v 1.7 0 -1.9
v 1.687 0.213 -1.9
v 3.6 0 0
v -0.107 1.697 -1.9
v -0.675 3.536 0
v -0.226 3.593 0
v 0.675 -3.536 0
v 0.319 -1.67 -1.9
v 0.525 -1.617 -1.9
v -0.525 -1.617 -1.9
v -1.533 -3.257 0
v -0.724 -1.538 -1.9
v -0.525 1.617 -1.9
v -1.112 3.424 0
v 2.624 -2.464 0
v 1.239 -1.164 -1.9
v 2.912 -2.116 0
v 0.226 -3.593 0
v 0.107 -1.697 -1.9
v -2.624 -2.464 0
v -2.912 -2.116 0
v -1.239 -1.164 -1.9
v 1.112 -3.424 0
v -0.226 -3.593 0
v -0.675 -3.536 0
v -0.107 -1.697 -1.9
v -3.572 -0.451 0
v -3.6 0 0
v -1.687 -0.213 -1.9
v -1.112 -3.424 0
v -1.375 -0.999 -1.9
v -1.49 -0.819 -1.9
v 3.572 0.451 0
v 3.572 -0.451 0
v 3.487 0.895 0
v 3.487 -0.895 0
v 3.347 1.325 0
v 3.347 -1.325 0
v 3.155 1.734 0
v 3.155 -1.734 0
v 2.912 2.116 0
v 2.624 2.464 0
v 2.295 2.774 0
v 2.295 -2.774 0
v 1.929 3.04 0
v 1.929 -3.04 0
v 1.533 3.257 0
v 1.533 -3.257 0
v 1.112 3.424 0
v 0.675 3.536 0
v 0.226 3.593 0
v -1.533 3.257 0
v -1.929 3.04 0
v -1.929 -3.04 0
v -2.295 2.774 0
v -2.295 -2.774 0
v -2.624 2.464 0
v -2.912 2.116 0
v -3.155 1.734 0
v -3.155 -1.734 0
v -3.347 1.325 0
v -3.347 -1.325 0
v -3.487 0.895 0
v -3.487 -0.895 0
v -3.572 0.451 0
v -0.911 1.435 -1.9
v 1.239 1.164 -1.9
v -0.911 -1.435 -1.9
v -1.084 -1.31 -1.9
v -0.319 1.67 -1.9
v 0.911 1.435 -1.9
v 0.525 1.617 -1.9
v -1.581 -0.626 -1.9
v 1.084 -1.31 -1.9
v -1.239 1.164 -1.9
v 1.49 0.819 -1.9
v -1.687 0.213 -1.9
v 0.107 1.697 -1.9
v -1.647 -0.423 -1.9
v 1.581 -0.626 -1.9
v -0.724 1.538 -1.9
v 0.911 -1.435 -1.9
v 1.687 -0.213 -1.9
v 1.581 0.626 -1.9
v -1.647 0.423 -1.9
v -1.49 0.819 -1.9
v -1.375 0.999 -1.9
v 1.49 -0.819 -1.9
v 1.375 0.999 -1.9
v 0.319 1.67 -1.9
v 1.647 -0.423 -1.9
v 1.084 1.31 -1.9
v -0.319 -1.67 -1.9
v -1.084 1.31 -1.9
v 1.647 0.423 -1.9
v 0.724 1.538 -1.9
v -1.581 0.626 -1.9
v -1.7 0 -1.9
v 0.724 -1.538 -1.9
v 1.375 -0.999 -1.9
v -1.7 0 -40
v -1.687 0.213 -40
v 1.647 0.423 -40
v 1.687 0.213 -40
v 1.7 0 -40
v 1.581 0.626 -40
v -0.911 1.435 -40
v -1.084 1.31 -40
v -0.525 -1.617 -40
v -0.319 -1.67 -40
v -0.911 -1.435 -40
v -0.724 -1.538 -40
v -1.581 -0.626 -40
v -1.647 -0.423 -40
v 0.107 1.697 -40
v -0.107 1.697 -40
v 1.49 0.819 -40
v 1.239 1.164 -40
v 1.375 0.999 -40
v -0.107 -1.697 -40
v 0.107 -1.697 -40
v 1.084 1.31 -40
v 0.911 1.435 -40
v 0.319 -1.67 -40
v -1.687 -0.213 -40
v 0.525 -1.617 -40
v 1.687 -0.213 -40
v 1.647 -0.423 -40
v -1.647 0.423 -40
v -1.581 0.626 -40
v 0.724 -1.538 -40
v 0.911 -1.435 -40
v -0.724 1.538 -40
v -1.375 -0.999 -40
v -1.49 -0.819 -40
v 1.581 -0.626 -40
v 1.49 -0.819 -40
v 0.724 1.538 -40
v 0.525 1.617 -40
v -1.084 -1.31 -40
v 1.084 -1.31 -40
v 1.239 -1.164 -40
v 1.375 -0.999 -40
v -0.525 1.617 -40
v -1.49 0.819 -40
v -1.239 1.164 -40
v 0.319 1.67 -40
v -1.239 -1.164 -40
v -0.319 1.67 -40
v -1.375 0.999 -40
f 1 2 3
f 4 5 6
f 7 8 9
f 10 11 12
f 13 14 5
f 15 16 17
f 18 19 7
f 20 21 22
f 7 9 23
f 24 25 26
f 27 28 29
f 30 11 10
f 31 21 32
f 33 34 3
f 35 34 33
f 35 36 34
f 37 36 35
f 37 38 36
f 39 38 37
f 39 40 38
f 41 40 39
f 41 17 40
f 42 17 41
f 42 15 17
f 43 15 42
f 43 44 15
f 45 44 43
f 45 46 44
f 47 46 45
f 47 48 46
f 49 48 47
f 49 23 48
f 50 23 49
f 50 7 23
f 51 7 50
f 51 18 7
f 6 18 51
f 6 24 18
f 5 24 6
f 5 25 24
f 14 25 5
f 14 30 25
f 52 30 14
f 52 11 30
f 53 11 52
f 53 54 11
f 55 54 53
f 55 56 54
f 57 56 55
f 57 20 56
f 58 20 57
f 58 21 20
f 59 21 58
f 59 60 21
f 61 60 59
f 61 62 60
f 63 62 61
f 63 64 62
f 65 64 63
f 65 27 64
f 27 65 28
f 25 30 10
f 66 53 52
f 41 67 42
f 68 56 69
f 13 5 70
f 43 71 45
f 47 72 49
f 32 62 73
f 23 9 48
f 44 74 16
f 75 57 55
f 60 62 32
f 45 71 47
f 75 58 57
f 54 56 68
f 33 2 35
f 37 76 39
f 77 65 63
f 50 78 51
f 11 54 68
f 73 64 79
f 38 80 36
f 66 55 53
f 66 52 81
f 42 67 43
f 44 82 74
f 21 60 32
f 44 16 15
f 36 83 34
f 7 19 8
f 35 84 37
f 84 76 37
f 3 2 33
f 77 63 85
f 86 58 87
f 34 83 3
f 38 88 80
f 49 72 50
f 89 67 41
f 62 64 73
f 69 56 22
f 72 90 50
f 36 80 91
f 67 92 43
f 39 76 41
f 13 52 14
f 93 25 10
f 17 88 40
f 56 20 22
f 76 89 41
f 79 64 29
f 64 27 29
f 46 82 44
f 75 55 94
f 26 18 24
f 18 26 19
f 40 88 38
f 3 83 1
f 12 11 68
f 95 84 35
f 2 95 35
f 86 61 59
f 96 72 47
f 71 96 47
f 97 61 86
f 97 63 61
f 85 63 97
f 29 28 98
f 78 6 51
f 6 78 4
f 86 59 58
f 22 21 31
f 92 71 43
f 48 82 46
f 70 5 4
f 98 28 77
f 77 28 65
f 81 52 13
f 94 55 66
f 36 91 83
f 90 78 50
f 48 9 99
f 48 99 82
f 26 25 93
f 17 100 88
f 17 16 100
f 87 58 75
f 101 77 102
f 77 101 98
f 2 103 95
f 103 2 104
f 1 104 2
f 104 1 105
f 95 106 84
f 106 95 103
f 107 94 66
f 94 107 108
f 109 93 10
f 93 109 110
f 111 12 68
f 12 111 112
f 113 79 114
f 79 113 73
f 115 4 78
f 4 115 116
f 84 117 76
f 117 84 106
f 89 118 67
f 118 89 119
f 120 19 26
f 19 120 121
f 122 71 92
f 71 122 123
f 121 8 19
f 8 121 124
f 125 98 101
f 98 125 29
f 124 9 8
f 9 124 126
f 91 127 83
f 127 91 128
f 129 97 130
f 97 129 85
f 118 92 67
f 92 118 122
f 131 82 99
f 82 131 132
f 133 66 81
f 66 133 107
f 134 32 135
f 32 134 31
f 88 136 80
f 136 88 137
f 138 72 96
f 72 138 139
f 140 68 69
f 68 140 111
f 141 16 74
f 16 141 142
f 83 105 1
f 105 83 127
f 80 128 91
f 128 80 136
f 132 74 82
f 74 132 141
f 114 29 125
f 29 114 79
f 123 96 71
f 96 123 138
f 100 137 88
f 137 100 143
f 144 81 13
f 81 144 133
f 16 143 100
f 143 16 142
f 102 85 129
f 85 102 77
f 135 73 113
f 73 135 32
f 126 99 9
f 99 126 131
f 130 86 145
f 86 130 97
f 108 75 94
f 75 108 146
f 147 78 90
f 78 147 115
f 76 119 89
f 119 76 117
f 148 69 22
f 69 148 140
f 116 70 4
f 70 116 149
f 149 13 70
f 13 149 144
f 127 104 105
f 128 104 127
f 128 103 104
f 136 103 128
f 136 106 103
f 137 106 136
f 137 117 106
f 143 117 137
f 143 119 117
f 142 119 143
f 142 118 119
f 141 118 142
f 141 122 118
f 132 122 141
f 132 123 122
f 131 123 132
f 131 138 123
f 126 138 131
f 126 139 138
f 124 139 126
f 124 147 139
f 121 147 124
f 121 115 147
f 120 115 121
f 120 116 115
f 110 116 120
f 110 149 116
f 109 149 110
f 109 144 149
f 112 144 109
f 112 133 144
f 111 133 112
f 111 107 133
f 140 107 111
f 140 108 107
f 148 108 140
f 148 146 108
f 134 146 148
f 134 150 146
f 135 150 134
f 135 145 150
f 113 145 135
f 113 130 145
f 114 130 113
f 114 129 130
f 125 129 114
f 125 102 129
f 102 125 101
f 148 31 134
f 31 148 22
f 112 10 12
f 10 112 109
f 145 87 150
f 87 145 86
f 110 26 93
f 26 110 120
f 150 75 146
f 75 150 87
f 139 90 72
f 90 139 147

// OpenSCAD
// Generated by SolidPython 1.1.3 on 2023-03-13 21:43:03
$fn = 50;


difference() {
	union() {
		translate(v = [0, 0, -1.9000000000]) {
			rotate(a = [0, 0, 0]) {
				cylinder(h = 1.9000000000, r1 = 1.7000000000, r2 = 3.6000000000);
			}
		}
		translate(v = [0, 0, -40]) {
			rotate(a = [0, 0, 0]) {
				cylinder(h = 40, r = 1.7000000000);
			}
		}
	}
	union();
}
/***********************************************
*********      SolidPython code:      **********
************************************************
 
from solid import *
import os
import subprocess

import oomB

import opsc_library_gen

mode = "laser"
#mode = "3d_print"

defined_objects = {}

radius_dict = {}
countersunk_dict = {}


def set_mode(m):
    global mode
    mode = m
    radius_dict['M6'] = 6.5/2
    radius_dict['M3'] = 3.3/2
    if mode == "laser":
        radius_dict['M6'] = 6/2
        radius_dict['M3'] = 3/2

    countersunk_dict['M3'] = {}
    countersunk_dict['M3']['little_rad'] = radius_dict['M3']
    countersunk_dict['M3']['big_rad'] = (5.5+0.6)/2
    if mode == "laser":
        countersunk_dict['M3']['big_rad'] = (4.75+0.6)/2
        countersunk_dict['M3']['little_rad'] = (4.75+0.6)/2

    countersunk_dict['M3']['height'] = 1.7


def opsc_make_object(filename, objects, save_type="none",resolution=50, layers = 1, tilediff = 200, mode="laser", overwrite=True):
    if overwrite or not os.path.exists(filename):
        set_mode(mode)
        save_type = save_type.lower()
        os.makedirs(os.path.dirname(filename), exist_ok=True)
        final_object = opsc_get_object(objects, mode = mode)
        # Save the final object to the specified filename    
        scad_render_to_file(final_object, filename, file_header='$fn = %s;' % resolution, include_orig_code=True)
        if save_type == "all":
            saveToAll(filename)
        elif save_type == "dxf":
            saveToDxf(filename)
        if mode == "laser":
            filename_laser = filename.replace(".scad","-flat.scad")
            scad_render_to_file(getLaser(final_object, layers=layers, tilediff=tilediff), filename_laser, file_header='$fn = %s;' % resolution, include_orig_code=True)
            if save_type == "all":
                saveToAll(filename_laser)
            elif save_type == "dxf":
                saveToDxf(filename_laser)


def opsc_get_object(objects, mode = "laser"):
    # Create the solidpython objects only include the positive objects and if they don't have inclusion or their inclusion is either all or mode
    # Initialize an empty list to store the results
    positive_objects = []

    # Iterate over the "objects" list
    for obj in objects:
        # Check if the current object has a "type" key with a value of "positive"
        if obj['type'] == 'positive':
            # Check if the current object has an "inclusion" key and its value matches "mode",
            # or if the current object does not have an "inclusion" key at all
            if not 'inclusion' in obj or obj['inclusion'] == "all" or obj['inclusion'] == mode:
                # Call the "get_opsc_item" function with the current object as an argument
                opsc_item = get_opsc_item(obj)
                # Add the result to the "positive_objects" list
                positive_objects.append(opsc_item)
# Initialize an empty list to store the results
    negative_objects = []

    # Iterate over the "objects" list
    for obj in objects:
        # Check if the current object has a "type" key with a value of "negative"
        if obj['type'] == 'negative':
            # Check if the current object has an "inclusion" key and its value matches "mode",
            # or if the current object does not have an "inclusion" key at all
            if not 'inclusion' in obj or obj['inclusion'] == "all" or obj['inclusion'] == mode:
                # Call the "get_opsc_item" function with the current object as an argument
                opsc_item = get_opsc_item(obj)
                # Add the result to the "negative_objects" list
                negative_objects.append(opsc_item)
    
    #positive_objects = [get_opsc_item(obj) for obj in objects if obj['type'] == 'positive']
    #negative_objects = [get_opsc_item(obj) for obj in objects if obj['type'] == 'negative']
    # Union the positive objects
    positive_object = union()(*positive_objects)
    # Union the negative objects
    negative_object = union()(*negative_objects)
    # Create the final object by subtracting the negative objects from the positive objects
    return difference()(positive_object, negative_object)

def get_opsc_item(params):
    # A dictionary to map radius string values to numerical values
    #radius_dict = {'small': 5, 'medium': 10, 'large': 15}
    # An array of function names for basic shapes
    basic_shapes = ['cube', 'sphere', 'cylinder']
    
    # An array of function names for other shapes
    other_shapes = ['hole', 'slot', 'rounded_rectangle', 'countersunk', 'polyg']
    


    # Convert radius to r if present, and remove radius from the params dictionary
    if 'radius' in params:
        if isinstance(params['radius'], str):
            # Use the radius_dict to map the radius string value to a numerical value
            params['r'] = radius_dict[params['radius']]
        else:
            params['r'] = params['radius']
        del params['radius']
    

    # Check if the object type is a basic shape
    if params['shape'] in basic_shapes:
        # Remove shape and unexpected dictionary values
        allowed_keys = {'size', 'r', 'r1', 'r2', 'd', 'h', 'rw', 'rh', 'dw', 'dh'}
        shape_params = {k: v for k, v in params.items() if k in allowed_keys}

        #params['m'] = "#"
        ###split for adding modifier
        try:
            m = params['m']
            func = globals()[params['shape']]
            return_value = get_opsc_transform(params,func(**shape_params))
            return_value = (return_value).set_modifier(m)
            return return_value
        except KeyError as e:
            return get_opsc_transform(params,globals()[params['shape']](**shape_params))
        
    elif params['shape'] == 'polygon':
        # Remove shape and unexpected dictionary values
        h  = params['height']
        allowed_keys = {'points'}
        shape_params = {k: v for k, v in params.items() if k in allowed_keys}

        # Call the corresponding function for the shape parameter, using ** notation to pass the shape_params dictionary as keyword arguments
        params["rot"] = [0,0,0]        
        try:
            m = params['m']
            func = globals()[params['shape']]
            return_value = get_opsc_transform(params,linear_extrude(h)(globals()[params['shape']](**shape_params)))
            return_value = (return_value).set_modifier(m)
            return return_value
        except KeyError as e:
            return_value = get_opsc_transform(params,linear_extrude(h)(globals()[params['shape']](**shape_params)))
            return_value = (return_value)
            return return_value


    # If the object type is not a basic shape, check if it's a defined object or one of the other shapes
    elif params['shape'] in other_shapes:
        # Call the corresponding function for the shape parameter, passing the params dictionary as an argument
        p2 = copy.deepcopy(params)
        p2["pos"] = [0,0,0]
        return get_opsc_transform(params,globals()[params['shape']](p2))
    
    # If the object is not a basic shape or a defined object, try to import it from a .scad file
    else:
        obj = defined_objects[params['shape']]
        return get_opsc_transform(params,obj)

def get_opsc_transform(params, solid_obj):
    # Rotate the object based on the 'rot' field in the params dictionary, or the 'rotX', 'rotY', and 'rotZ' fields if 'rot' is not present
    rot = params.get('rot', [])
    if rot:
        rotX, rotY, rotZ = rot
    else:
        rotX = params.get('rotX', 0)
        rotY = params.get('rotY', 0)
        rotZ = params.get('rotZ', 0)
    solid_obj = rotate([rotX, rotY, rotZ])(solid_obj)

    # Translate the object based on the 'pos' field in the params dictionary, or the 'x', 'y', and 'z' fields if 'pos' is not present
    pos = params.get('pos', [])
    if pos:
        x, y, z = pos
    else:
        x = params.get('x', 0)
        y = params.get('y', 0)
        z = params.get('z', 0)
    solid_obj = translate([x, y, z])(solid_obj)
    return solid_obj


import random

def opsc_easy_array(type, shape, repeats, pos_start, shift_arr, **kwargs):
    for i in range(0,3):
        repeats.append(1)
        pos_start.append(0)
        shift_arr.append(0)
    return_objects = []

    for x in range(0,repeats[0]):
        for y in range(0,repeats[1]):
            for z in range(0,repeats[2]):
                return_objects.append(opsc_easy(type, shape, pos=[pos_start[0]+x*shift_arr[0],pos_start[1]+y*shift_arr[1],pos_start[2]+z*shift_arr[2]], **kwargs))
    return return_objects                



def opsc_easy(type, shape, **kwargs):
    obj = {
        'type': type,
        'shape': shape
    }
    for param in ['size', 'r', 'r1', 'r2', 'd', 'h', 'rw', 'rh', 'dw', 'dh', 'pos', 'x', 'y', 'z', 'rot', 'rotX', 'rotY', 'rotZ', "w", "inclusion", 'sides', 'height', "m"]:
        if param in kwargs:
            obj[param] = kwargs[param]
    return obj

def hole(params):
    p2 = copy.deepcopy(params)  
    # Check if the radius is a string and replace it with the corresponding value from the dictionary
    if isinstance(p2['r'], str):
        p2['r'] = radius_dict[p2['r']]
    
    # Set the height to 100 if not specified
    if 'h' not in p2:
        p2['h'] = 100
        p2["pos"] = [0,0,-50]
    p2["center"] = True
    # Create the cylinder object
    p2["shape"] = "cylinder"
    p2["type"] = "positive"

    return get_opsc_item(p2)

import copy

def countersunk(params):
    p2 = copy.deepcopy(params)
    counter_rad = p2['r']
    p2['r'] = radius_dict[p2['r']]
    hp = copy.deepcopy(p2)
    hp["type"] = "positive"
    hp["shape"] = "hole"
    del hp["rot"]
    hol = get_opsc_item(hp)
    
    cp = copy.deepcopy(p2)
    cp["h"] = countersunk_dict[counter_rad]["height"]
    cp["r2"] = countersunk_dict[counter_rad]["little_rad"]
    cp["r1"] = countersunk_dict[counter_rad]["big_rad"]
    del cp["r"]
    del cp["rot"]
    cp["type"] = "positive"
    cp["shape"] = "cylinder"
    cp["pos"] = [0,0,0]

    top = get_opsc_item(cp)
    return union()(hol,top)



def slot(params):  
    p2 = copy.deepcopy(params) 
    if isinstance(p2['r'], str):
        p2['r'] = radius_dict[p2['r']]
    p2["type"] = "positive"
    p2["shape"] = "hole"
    del p2["rot"]
    p2["pos"] = [0,0,0]
    left = copy.deepcopy(p2)
    right = copy.deepcopy(p2)
    left["pos"][0] = p2["w"] / 2 - p2["r"] 
    
    right["pos"][0] = -p2["w"] / 2 + p2["r"] 
    pass
    leftObj = get_opsc_item(left)
    rightObj = get_opsc_item(right)
    return hull()(leftObj, rightObj)

def rounded_rectangle(params):   
    p2 = copy.deepcopy(params) 
    p2["h"] = p2["size"][2]
    p2["pos"] = p2.get("pos", [0, 0, 0]) 
    p2["type"] = "positive"
    p2["shape"] = "hole"
    p2["pos"] = [0,0,0]
    
    if 'rot' in p2:
        del p2["rot"]   
    if 'r' not in p2:
        p2["r"] = 5 
    tl = copy.deepcopy(p2)
    tr = copy.deepcopy(p2)
    bl = copy.deepcopy(p2)
    br = copy.deepcopy(p2)
    tl["pos"][0] = -(p2["size"][0] - p2["r"]*2)/2
    tl["pos"][1] = (p2["size"][1] - p2["r"]*2)/2
    tr["pos"][0] = (p2["size"][0] - p2["r"]*2)/2
    tr["pos"][1] = (p2["size"][1] - p2["r"]*2)/2
    bl["pos"][0] = -(p2["size"][0] - p2["r"]*2)/2
    bl["pos"][1] = -(p2["size"][1] - p2["r"]*2)/2
    br["pos"][0] = (p2["size"][0] - p2["r"]*2)/2
    br["pos"][1] = -(p2["size"][1] - p2["r"]*2)/2
    del tl["size"]
    del tr["size"]
    del bl["size"]
    del br["size"]
    tlo = get_opsc_item(tl)
    tro = get_opsc_item(tr)
    blo = get_opsc_item(bl)
    bro = get_opsc_item(br)    
    return hull()(tlo, tro, blo, bro)



def polyg(params):
    p2 = copy.deepcopy(params) 
    p2["type"] = "positive"
    p2["shape"] = "polygon"
    p2["pos"] = [0,0,0]
    sides = p2["sides"]
    radius = p2["r"]    
    angles = [i * 360 / sides for i in range(sides)]
    points = regular_polygon(sides, radius)
    
    p2["points"] = points
    return get_opsc_item(p2)

import math

def regular_polygon(num_sides, radius):
    # Calculate the angle between each side
    angle = 2 * math.pi / num_sides

    # Calculate the points of the polygon
    points = []
    for i in range(num_sides):
        x = radius * math.cos(i * angle)
        y = radius * math.sin(i * angle)
        points.append((x, y))
    return points

def import_scad_object(filename):
    # Import the .scad file and convert it to a solidpython object
    #filename = "parts"
    obj = import_scad(filename)
    return obj.main()



import os
import solid as solidpython

# A dictionary to store the defined objects


def load_scad_objects():
    opsc_library_gen.gen_library(defined_objects)

import random

def test(num_objects):
    objects = []
    for i in range(num_objects):
        # Choose a random shape
        #shape = random.choice(['cube', 'sphere', 'cylinder', 'hole', 'slot', "rounded_rectangle"])
        shape = random.choice(["rounded_rectangle"])

        # Choose a random type
        type = random.choice(['positive', 'negative'])
        
        # Create an empty object dictionary
        obj = {'shape': shape, 'type': type}
        
        # Set shape-specific parameters
        if obj['shape'] in ['cube']:
            obj['size'] =  [random.uniform(5, 15), random.uniform(5, 15), random.uniform(5, 15)]
        if obj['shape'] in ['rounded_rectangle']:
            obj['size'] =  [random.uniform(5, 15), random.uniform(5, 15), random.uniform(5, 15)]
            obj['r'] = random.uniform(0.5, 5)
        elif obj['shape'] == 'sphere':
            obj['r'] = random.uniform(5, 15)
        elif obj['shape'] in ['cylinder', 'hole']:
            obj['r'] = random.uniform(0.5, 5)
            obj['h'] = random.uniform(5, 15)
        elif obj['shape'] == 'slot':
            obj['r'] = random.uniform(0.5, 5)
            obj['h'] = random.uniform(5, 15)
            obj['w'] = random.uniform(5, 15)
        
        # Set a random position and rotation
        obj['pos'] = [random.uniform(-20, 20), random.uniform(-20, 20), random.uniform(-20, 20)]
        obj['rot'] = [random.uniform(-180, 180), random.uniform(-180, 180), random.uniform(-180, 180)]
        
        # Add the object to the list
        objects.append(obj)
    return objects

####### old file saving
def saveToAll(fileIn):
    saveToStl(fileIn)
    saveToDxf(fileIn)
    saveToPng(fileIn)
    saveToSvg(fileIn)

def saveToDxf(fileIn, fileOut="", copy_to_laser=True):
    if fileOut == "":
        fileOut = fileIn.replace(".scad",".dxf")
    saveToFile(fileIn, fileOut)


    
def saveToPng(fileIn, fileOut="",extra="--render"):
    if fileOut == "":
        fileOut = fileIn.replace(".scad",".png")
    saveToFile(fileIn, fileOut)

def saveToStl(fileIn, fileOut=""):
    if fileOut == "":
        fileOut = fileIn.replace(".scad",".stl")
    saveToFile(fileIn, fileOut)
    
def saveToSvg(fileIn, fileOut=""):
    if fileOut == "":
        fileOut = fileIn.replace(".scad",".svg")
    saveToFile(fileIn, fileOut)

def saveToFile(fileIn, fileOut,extra=""):
    #extra = extra + " --colorscheme Tomorrow"

    launchStr = 'openscad -o "' + fileOut + '"' + extra + ' "' + fileIn + '"'
    if ".png" in fileOut:
        launchStr = launchStr + " --render"
    print("            saveToFile launch string: " + launchStr)
    subprocess.run(launchStr)
    x=0

def getLaser(final_object,start=1.5,layers=1,thickness=3,tilediff=200):
        rv= []

        for x in range(layers):
            rv.append(translate([0,x*tilediff,0])(
                    projection()(
                        intersection()(translate([-500,-500,start+x*thickness])(cube(size=[1000,1000,0.1])),
                            final_object
                        )
                    )
            )
            )
            
        return union()(rv)

set_mode("laser")
load_scad_objects() 
 
************************************************/
